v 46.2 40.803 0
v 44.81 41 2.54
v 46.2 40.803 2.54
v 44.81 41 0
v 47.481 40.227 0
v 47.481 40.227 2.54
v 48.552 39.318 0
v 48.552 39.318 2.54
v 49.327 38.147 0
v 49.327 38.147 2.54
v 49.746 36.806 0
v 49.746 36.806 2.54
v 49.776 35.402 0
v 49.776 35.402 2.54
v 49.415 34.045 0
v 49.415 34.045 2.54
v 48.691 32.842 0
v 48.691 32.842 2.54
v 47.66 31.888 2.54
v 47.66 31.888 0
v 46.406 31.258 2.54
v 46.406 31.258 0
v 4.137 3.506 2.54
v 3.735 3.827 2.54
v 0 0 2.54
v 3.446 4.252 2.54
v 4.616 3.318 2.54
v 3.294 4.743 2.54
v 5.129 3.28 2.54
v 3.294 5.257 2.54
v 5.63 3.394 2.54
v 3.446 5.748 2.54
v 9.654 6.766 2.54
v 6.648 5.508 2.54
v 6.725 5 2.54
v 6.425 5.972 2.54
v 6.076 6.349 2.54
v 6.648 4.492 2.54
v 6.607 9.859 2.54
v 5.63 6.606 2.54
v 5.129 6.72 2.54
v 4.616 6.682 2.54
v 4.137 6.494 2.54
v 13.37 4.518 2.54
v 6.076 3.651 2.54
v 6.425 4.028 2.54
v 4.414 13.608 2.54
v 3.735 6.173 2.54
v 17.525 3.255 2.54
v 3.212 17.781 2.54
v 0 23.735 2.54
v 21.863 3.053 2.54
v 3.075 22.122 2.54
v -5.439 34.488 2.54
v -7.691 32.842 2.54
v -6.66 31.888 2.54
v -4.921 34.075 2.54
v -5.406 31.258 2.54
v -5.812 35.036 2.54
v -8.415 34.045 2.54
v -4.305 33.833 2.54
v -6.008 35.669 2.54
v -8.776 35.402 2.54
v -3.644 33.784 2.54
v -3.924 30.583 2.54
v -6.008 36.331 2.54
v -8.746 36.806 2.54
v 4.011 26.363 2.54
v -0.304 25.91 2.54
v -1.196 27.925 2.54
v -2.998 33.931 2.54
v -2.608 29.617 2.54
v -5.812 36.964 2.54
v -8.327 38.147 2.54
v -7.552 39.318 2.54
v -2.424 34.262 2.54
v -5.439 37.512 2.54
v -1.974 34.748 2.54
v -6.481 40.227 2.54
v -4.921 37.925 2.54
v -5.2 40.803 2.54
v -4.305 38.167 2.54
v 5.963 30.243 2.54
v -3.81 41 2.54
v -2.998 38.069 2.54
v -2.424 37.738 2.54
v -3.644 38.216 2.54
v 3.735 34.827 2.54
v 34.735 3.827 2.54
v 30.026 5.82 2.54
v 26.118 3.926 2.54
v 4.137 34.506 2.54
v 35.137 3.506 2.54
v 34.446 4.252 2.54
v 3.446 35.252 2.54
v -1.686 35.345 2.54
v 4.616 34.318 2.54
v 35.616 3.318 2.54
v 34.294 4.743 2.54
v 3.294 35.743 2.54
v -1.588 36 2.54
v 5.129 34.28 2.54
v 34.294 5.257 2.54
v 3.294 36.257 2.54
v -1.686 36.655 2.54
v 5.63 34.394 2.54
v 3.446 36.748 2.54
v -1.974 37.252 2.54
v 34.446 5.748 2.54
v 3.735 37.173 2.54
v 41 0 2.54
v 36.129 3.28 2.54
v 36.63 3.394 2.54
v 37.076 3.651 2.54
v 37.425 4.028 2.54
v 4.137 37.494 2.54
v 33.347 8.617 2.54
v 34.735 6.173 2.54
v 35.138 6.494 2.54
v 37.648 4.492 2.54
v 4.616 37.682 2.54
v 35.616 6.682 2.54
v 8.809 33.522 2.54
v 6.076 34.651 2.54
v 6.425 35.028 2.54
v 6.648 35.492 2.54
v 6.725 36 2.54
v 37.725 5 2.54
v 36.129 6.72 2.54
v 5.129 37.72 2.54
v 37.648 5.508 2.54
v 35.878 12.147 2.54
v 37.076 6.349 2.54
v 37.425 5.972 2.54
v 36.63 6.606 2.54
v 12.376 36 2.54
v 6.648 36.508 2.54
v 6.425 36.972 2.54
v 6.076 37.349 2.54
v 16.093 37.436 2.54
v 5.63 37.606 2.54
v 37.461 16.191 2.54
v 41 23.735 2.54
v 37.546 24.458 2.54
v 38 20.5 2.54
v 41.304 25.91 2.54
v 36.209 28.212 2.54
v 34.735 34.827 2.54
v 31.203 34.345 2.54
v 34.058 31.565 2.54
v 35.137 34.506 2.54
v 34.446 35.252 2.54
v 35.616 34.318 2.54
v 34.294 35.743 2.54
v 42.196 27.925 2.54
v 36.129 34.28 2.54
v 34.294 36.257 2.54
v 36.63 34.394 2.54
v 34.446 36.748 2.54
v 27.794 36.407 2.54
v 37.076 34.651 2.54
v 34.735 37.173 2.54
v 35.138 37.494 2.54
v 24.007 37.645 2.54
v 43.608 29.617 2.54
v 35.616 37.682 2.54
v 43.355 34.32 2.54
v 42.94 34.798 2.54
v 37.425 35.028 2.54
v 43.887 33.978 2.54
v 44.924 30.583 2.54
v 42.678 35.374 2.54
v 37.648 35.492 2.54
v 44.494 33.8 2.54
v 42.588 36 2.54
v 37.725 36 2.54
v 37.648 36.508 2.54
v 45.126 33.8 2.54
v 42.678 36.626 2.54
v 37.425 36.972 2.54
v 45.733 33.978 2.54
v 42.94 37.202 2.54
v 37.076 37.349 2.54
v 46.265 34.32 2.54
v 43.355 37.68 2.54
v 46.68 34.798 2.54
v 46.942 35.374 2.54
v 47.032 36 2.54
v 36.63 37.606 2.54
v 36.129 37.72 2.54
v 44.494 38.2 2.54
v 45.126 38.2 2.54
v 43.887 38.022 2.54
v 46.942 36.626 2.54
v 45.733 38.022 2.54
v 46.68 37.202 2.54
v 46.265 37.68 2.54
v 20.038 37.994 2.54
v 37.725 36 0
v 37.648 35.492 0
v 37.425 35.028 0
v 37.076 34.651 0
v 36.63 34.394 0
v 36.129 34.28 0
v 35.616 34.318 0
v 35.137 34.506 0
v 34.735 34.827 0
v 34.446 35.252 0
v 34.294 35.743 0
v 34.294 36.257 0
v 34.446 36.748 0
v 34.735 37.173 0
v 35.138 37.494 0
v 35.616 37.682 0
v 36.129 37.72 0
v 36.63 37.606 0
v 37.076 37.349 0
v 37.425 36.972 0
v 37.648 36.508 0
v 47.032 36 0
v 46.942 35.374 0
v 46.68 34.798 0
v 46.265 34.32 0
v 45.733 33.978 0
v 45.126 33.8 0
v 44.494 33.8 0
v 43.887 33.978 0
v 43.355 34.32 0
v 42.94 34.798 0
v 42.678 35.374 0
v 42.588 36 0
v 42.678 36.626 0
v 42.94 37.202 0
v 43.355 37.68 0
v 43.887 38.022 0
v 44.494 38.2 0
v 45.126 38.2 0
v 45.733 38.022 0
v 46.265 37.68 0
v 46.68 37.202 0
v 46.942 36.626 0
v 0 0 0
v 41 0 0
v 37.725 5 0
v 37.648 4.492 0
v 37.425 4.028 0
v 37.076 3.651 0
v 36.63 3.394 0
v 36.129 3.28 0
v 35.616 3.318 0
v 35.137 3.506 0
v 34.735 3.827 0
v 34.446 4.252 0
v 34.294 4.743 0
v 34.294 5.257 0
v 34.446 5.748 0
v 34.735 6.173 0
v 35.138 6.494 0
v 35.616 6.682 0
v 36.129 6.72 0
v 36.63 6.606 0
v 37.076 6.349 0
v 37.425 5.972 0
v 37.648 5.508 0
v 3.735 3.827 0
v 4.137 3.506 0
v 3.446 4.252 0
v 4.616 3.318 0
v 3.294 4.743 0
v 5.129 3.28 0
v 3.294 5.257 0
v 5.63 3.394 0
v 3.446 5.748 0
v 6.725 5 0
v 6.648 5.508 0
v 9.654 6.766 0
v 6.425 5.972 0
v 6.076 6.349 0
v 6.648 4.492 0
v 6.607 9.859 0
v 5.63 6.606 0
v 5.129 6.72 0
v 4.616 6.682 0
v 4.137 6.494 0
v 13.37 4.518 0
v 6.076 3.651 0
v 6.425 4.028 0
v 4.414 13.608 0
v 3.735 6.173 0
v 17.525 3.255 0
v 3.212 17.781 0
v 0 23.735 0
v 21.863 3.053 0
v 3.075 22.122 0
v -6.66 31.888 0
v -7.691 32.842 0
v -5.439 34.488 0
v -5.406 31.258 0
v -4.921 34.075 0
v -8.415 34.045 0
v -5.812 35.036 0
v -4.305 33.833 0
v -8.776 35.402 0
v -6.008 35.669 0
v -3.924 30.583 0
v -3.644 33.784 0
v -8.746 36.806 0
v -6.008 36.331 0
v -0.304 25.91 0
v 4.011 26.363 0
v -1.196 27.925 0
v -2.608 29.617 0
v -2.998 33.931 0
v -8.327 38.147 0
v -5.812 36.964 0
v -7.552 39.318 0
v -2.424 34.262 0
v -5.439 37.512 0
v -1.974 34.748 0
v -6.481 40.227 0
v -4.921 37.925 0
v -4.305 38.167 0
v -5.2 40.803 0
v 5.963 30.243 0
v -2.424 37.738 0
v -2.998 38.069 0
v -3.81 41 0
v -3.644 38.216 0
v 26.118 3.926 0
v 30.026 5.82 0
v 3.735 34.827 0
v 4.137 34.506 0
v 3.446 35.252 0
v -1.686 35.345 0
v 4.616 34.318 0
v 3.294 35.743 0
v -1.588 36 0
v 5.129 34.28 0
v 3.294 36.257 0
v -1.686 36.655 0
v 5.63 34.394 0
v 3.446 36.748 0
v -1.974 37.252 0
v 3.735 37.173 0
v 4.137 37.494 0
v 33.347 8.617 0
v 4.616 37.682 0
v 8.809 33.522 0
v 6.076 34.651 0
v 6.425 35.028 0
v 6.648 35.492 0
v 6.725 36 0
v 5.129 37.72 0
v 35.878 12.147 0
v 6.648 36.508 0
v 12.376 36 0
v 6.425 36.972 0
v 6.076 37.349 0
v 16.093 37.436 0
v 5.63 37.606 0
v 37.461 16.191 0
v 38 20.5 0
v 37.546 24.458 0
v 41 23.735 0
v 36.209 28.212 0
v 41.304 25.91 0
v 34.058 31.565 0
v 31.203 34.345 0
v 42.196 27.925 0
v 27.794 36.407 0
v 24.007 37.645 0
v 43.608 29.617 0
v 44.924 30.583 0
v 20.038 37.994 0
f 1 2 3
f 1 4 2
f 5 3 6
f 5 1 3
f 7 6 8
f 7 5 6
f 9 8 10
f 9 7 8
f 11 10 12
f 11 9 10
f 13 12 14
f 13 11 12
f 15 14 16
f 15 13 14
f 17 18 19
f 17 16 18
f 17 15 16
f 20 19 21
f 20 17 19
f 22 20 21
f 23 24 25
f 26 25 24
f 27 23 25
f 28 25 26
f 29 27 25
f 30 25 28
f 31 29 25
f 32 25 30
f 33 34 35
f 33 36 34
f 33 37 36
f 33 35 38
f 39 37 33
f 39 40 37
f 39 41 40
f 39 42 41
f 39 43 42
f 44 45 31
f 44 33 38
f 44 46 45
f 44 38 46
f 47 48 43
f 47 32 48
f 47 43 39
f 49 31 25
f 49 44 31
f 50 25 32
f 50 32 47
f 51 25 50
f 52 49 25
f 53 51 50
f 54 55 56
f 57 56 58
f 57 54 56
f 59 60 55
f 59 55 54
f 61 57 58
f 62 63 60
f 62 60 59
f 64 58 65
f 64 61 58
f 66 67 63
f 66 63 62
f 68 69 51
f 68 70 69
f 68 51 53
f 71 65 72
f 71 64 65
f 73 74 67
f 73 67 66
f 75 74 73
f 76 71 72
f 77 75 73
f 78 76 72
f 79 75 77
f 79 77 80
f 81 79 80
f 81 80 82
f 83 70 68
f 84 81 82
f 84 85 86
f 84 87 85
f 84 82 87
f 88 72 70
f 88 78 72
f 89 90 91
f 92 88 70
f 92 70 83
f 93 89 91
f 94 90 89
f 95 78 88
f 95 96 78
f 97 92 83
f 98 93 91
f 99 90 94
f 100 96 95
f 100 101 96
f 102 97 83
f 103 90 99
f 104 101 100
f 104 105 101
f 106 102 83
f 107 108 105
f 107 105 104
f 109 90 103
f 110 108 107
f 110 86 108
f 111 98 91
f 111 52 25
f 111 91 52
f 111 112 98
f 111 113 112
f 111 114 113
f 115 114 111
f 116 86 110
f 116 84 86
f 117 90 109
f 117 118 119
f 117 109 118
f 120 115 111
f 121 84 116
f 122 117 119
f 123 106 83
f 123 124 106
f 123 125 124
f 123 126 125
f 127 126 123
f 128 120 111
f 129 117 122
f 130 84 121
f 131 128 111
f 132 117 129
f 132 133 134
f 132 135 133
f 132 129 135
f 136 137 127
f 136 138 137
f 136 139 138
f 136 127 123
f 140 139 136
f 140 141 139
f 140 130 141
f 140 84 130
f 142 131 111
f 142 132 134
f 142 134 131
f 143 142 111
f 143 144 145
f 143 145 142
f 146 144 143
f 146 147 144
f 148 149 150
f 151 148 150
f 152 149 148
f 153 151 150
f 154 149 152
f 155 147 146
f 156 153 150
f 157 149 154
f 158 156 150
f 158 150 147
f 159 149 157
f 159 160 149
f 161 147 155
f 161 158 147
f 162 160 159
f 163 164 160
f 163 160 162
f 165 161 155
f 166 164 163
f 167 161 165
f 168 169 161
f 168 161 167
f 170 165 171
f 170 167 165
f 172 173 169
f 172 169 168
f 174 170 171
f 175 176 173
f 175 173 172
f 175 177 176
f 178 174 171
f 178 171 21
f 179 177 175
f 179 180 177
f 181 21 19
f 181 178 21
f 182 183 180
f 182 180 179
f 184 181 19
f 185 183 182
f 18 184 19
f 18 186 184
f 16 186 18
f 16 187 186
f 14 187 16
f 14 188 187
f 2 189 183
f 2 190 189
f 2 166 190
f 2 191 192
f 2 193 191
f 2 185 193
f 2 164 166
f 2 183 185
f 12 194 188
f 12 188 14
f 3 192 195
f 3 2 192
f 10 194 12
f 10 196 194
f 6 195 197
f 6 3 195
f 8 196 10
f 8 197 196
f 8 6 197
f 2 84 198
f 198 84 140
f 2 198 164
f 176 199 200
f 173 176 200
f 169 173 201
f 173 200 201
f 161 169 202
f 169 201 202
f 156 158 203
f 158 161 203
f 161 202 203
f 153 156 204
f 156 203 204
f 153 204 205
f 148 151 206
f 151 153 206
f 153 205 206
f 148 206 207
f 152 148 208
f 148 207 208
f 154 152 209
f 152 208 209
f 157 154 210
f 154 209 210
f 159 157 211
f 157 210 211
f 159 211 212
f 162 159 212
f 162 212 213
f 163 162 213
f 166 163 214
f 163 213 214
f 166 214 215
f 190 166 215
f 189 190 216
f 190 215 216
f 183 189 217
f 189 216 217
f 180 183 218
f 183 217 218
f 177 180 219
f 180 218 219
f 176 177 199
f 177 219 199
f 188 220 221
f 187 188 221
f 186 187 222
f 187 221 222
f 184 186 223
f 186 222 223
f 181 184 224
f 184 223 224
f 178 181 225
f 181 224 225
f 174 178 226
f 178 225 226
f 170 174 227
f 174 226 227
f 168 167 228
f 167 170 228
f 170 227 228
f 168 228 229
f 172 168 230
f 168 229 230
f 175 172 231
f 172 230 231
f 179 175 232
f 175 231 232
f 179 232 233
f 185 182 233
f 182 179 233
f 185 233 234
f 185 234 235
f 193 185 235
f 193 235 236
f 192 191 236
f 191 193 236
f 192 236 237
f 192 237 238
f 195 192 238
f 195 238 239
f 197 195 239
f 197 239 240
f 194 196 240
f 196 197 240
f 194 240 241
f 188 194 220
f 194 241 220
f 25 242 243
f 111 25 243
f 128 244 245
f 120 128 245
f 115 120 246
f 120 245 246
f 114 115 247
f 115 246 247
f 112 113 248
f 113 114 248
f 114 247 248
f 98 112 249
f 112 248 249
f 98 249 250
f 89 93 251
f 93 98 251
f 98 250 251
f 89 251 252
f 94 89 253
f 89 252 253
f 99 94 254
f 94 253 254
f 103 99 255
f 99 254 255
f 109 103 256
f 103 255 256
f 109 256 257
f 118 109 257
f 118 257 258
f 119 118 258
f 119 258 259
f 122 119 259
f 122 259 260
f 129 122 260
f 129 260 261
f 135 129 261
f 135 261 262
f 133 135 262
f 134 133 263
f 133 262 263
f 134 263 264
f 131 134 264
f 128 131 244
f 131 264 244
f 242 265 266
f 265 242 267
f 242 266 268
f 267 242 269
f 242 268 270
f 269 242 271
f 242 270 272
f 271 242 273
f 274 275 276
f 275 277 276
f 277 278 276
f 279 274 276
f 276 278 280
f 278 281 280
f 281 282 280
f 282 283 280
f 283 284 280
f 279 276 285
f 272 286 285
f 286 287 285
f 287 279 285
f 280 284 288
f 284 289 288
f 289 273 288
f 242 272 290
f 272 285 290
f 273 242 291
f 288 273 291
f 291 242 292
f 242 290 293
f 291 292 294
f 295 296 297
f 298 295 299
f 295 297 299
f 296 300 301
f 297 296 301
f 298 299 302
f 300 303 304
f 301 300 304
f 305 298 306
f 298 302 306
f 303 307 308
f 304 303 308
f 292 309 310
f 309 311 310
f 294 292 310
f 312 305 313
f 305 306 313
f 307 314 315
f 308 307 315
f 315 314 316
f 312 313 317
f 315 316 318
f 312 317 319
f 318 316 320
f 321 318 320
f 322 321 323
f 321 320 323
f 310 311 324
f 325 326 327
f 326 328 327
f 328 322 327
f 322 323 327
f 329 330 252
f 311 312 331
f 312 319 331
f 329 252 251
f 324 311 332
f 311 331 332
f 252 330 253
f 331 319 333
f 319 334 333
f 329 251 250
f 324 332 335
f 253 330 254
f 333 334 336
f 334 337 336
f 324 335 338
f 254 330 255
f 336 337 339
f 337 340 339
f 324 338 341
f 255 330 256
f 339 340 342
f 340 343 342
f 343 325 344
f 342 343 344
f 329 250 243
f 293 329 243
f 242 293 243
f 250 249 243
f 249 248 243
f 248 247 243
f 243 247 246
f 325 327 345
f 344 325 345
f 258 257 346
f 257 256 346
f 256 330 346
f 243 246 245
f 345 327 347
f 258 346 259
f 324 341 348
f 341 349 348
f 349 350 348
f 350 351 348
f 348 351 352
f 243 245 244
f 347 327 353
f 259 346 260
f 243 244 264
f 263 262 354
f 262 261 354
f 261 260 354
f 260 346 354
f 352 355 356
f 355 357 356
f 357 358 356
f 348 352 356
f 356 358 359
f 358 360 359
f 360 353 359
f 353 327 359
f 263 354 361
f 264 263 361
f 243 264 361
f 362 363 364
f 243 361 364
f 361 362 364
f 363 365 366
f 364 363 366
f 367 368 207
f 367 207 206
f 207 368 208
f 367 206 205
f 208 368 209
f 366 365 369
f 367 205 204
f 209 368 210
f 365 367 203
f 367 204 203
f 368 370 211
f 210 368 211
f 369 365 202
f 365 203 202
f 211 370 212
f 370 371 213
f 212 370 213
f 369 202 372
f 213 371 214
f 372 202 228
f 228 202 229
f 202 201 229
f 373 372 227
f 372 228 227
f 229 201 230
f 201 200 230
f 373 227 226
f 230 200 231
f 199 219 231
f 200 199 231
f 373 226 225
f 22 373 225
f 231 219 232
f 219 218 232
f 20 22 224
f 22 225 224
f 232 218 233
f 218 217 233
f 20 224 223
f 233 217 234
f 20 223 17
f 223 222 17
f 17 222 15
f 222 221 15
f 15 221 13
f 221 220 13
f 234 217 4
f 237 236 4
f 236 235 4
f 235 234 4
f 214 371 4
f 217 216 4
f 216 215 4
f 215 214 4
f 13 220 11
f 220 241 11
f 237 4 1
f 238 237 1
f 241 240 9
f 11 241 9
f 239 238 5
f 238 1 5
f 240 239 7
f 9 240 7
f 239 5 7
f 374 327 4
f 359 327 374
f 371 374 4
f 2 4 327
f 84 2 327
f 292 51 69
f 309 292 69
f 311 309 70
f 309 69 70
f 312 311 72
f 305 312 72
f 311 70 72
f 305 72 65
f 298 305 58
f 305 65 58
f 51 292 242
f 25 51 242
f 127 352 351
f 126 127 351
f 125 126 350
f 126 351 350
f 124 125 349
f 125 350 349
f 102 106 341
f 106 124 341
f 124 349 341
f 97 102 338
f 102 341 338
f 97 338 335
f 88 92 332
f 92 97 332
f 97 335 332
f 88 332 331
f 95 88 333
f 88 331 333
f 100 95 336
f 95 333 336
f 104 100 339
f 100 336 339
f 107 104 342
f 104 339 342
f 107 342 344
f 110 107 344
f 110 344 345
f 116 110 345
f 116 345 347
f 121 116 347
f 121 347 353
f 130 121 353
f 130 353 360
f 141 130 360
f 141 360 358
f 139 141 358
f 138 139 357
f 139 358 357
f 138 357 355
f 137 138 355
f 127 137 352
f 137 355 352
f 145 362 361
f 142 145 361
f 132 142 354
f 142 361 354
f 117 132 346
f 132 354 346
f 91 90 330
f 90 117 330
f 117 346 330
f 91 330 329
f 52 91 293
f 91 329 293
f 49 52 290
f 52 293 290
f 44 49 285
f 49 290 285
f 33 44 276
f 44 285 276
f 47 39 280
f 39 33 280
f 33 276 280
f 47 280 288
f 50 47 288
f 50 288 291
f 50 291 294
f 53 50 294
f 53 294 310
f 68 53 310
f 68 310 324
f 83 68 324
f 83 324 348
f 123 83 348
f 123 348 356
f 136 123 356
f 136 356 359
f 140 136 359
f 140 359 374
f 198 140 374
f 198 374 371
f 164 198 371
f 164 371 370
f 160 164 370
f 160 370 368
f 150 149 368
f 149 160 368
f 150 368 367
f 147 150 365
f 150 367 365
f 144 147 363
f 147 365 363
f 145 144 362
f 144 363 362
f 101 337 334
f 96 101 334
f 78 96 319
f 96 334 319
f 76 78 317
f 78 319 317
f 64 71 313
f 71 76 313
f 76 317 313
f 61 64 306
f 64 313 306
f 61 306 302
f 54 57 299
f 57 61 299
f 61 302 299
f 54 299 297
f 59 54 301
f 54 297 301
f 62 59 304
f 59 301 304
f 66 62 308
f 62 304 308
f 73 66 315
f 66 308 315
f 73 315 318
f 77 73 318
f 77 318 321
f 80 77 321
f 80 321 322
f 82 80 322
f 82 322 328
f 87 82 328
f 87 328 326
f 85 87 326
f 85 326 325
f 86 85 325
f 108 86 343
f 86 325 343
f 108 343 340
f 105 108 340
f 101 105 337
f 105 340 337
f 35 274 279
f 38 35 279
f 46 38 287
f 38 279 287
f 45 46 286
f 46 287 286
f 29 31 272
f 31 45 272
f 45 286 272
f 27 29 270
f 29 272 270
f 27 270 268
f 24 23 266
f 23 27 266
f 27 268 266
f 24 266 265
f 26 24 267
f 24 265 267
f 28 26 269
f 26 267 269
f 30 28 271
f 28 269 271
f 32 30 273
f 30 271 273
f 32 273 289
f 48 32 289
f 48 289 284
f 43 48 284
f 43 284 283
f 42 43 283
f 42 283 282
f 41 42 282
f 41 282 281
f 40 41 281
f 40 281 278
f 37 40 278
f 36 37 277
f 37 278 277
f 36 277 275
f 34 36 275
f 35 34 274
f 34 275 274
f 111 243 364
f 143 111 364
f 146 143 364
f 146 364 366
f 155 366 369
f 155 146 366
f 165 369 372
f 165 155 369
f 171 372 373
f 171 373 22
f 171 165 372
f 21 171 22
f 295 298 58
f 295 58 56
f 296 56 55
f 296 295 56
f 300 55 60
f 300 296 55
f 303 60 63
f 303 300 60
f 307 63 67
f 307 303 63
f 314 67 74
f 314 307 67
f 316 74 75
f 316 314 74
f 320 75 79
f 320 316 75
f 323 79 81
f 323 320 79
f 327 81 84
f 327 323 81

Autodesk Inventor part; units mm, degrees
ref_plane "YZ Plane" through (0, 0, 0) normal (1, 0, 0) x (0, 1, 0)
ref_plane "XZ Plane" through (0, 0, 0) normal (0, 1, 0) x (-1, 0, 0)
ref_plane "XY Plane" through (0, 0, 0) normal (0, 0, 1) x (1, 0, 0)
sketch "Sketch1" plane through (0, 0, 0) normal (0, 0, 1) x (1, 0, 0)
  line L0 (0, 0) -> (41, 0)
  line L1 (41, 0) -> (41, 41)
  line L2 (41, 41) -> (0, 41)
  line L3 (0, 41) -> (0, 0)
  line L4 (20.5, 20.5) -> (20.5, 36)
  line L5 (20.5, 36) -> (5, 36)
  circle A0 centre (5, 36) radius 1.725
  circle A1 centre (36, 36) radius 1.725
  circle A2 centre (5, 5) radius 1.725
  circle A3 centre (36, 5) radius 1.725
  circle A4 centre (20.5, 20.5) radius 17.5
  line L6 (0, 36) -> (-3.81, 36)
  circle A5 centre (-3.81, 36) radius 2.2225
  line L7 (41, 36) -> (44.81, 36)
  circle A6 centre (44.81, 36) radius 2.2225
  line L8 (0, 41) -> (-3.81, 41)
  line L9 (0, 36) -> (0, 30.9962)
  line L10 (0, 30.9962) -> (-3.81, 30.9962)
  arc A7 (-3.81, 41) -> (-3.81, 30.9962) centre (-3.81, 35.9981) ccw
  line L11 (41, 41) -> (44.81, 41)
  line L12 (41, 36) -> (41, 30.9962)
  line L13 (41, 30.9962) -> (44.81, 30.9962)
  arc A8 (44.81, 30.9962) -> (44.81, 41) centre (44.81, 35.9981) ccw
  dimension "d0" = 41
  dimension "d1" = 41
  dimension "d2" = 15.5
  dimension "d3" = 15.5
  dimension "d4" = 3.45
  dimension "d7" = 31
  dimension "d10" = 31
  dimension "d13" = 35
  dimension "d14" = 3.81
  dimension "d15" = 4.445
  dimension "d16" = 3.81
  dimension "d17" = 4.445
  dimension "d18" = 5.0038
  dimension "d19" = 5.0038
extrude "Extrusion1" add sketch "Sketch1" along normal blind 2.54
fillet "Fillet1" radius 7.9375 2 edges at (0, 30.9962, 1.27) (41, 30.9962, 1.27)
properties part number "FanMount"
